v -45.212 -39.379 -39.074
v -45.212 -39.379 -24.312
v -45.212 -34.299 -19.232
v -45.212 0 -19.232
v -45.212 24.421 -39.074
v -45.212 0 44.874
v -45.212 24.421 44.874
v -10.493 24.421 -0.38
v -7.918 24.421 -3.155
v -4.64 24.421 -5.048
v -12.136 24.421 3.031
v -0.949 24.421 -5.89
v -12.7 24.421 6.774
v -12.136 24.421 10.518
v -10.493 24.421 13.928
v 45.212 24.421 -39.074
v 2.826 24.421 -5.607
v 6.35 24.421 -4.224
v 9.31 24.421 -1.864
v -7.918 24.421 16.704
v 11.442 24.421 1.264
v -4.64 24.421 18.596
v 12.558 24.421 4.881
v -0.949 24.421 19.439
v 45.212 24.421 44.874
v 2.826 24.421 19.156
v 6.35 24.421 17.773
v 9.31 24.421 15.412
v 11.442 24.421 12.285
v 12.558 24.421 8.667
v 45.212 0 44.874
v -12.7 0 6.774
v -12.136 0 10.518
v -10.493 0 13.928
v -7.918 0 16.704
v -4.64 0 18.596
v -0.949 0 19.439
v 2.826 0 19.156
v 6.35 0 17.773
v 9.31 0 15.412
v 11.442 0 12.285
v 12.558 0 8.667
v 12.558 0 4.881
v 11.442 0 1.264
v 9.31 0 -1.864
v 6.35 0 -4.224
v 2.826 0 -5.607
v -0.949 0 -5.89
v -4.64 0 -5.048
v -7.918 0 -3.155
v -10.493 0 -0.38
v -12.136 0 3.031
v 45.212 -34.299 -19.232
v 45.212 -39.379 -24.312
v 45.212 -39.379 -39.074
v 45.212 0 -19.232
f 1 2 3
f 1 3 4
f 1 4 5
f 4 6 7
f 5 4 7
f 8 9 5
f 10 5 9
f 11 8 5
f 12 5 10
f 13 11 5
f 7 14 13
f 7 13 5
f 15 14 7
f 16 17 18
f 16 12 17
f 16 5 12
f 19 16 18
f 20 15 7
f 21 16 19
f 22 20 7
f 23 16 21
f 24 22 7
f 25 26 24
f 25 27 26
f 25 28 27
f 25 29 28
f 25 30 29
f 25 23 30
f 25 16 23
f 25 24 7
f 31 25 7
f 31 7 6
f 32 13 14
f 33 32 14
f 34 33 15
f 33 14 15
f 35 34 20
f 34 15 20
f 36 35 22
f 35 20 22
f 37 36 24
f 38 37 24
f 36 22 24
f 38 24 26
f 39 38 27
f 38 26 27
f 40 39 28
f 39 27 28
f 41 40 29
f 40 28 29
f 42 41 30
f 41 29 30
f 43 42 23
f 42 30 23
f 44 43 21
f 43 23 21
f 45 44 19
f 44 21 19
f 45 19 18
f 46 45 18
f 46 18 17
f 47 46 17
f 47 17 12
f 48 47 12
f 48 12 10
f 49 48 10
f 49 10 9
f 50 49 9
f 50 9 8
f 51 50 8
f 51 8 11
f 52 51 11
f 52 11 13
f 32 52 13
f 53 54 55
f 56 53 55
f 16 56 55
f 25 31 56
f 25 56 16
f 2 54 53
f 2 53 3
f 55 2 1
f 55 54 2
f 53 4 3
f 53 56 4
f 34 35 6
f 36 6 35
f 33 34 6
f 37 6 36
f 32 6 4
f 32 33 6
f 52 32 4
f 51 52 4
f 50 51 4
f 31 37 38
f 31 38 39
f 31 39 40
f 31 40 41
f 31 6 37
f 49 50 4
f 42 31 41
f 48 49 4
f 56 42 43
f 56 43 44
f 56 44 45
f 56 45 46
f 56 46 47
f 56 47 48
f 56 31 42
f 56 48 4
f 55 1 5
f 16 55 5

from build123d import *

# Parameters (mm, degrees)
F1_DEPTH = 45.212
F2_R     = 12.7
F3_DEPTH = 25.4
F4_SIZE  = 5.08


# Not quite as in the source:
# - a feature of the source that left no trace in its solid (it failed there, or was rolled back) is left out


with BuildPart() as f1:
    # F0 (on Right) → F1 (new body, symmetric)
    with BuildSketch(Plane.YZ):
        Polygon((24.4213882834, -39.0742197633), (24.4213882834, 44.8742993176), (0, 44.8742993176), (0, -19.2318409681), (-39.3794849515, -19.2318409681), (-39.3794849515, -39.0742197633), align=None)
    extrude(amount=F1_DEPTH, both=True)

    # F2 (on face) → F3 (cut)
    with BuildSketch(Plane(origin=(0, 24.4213882834, 0), x_dir=(-1, 0, 0), z_dir=(0, 1, 0))):
        with Locations((0, 6.7742993176)):
            Circle(F2_R)
    extrude(amount=-F3_DEPTH, mode=Mode.SUBTRACT)

    # F4
    f4_edges = [f1.edges().sort_by_distance(p)[0] for p in [
        (0, -39.379485, -19.231841),
    ]]
    chamfer(f4_edges, length=F4_SIZE)


solid = f1.part
